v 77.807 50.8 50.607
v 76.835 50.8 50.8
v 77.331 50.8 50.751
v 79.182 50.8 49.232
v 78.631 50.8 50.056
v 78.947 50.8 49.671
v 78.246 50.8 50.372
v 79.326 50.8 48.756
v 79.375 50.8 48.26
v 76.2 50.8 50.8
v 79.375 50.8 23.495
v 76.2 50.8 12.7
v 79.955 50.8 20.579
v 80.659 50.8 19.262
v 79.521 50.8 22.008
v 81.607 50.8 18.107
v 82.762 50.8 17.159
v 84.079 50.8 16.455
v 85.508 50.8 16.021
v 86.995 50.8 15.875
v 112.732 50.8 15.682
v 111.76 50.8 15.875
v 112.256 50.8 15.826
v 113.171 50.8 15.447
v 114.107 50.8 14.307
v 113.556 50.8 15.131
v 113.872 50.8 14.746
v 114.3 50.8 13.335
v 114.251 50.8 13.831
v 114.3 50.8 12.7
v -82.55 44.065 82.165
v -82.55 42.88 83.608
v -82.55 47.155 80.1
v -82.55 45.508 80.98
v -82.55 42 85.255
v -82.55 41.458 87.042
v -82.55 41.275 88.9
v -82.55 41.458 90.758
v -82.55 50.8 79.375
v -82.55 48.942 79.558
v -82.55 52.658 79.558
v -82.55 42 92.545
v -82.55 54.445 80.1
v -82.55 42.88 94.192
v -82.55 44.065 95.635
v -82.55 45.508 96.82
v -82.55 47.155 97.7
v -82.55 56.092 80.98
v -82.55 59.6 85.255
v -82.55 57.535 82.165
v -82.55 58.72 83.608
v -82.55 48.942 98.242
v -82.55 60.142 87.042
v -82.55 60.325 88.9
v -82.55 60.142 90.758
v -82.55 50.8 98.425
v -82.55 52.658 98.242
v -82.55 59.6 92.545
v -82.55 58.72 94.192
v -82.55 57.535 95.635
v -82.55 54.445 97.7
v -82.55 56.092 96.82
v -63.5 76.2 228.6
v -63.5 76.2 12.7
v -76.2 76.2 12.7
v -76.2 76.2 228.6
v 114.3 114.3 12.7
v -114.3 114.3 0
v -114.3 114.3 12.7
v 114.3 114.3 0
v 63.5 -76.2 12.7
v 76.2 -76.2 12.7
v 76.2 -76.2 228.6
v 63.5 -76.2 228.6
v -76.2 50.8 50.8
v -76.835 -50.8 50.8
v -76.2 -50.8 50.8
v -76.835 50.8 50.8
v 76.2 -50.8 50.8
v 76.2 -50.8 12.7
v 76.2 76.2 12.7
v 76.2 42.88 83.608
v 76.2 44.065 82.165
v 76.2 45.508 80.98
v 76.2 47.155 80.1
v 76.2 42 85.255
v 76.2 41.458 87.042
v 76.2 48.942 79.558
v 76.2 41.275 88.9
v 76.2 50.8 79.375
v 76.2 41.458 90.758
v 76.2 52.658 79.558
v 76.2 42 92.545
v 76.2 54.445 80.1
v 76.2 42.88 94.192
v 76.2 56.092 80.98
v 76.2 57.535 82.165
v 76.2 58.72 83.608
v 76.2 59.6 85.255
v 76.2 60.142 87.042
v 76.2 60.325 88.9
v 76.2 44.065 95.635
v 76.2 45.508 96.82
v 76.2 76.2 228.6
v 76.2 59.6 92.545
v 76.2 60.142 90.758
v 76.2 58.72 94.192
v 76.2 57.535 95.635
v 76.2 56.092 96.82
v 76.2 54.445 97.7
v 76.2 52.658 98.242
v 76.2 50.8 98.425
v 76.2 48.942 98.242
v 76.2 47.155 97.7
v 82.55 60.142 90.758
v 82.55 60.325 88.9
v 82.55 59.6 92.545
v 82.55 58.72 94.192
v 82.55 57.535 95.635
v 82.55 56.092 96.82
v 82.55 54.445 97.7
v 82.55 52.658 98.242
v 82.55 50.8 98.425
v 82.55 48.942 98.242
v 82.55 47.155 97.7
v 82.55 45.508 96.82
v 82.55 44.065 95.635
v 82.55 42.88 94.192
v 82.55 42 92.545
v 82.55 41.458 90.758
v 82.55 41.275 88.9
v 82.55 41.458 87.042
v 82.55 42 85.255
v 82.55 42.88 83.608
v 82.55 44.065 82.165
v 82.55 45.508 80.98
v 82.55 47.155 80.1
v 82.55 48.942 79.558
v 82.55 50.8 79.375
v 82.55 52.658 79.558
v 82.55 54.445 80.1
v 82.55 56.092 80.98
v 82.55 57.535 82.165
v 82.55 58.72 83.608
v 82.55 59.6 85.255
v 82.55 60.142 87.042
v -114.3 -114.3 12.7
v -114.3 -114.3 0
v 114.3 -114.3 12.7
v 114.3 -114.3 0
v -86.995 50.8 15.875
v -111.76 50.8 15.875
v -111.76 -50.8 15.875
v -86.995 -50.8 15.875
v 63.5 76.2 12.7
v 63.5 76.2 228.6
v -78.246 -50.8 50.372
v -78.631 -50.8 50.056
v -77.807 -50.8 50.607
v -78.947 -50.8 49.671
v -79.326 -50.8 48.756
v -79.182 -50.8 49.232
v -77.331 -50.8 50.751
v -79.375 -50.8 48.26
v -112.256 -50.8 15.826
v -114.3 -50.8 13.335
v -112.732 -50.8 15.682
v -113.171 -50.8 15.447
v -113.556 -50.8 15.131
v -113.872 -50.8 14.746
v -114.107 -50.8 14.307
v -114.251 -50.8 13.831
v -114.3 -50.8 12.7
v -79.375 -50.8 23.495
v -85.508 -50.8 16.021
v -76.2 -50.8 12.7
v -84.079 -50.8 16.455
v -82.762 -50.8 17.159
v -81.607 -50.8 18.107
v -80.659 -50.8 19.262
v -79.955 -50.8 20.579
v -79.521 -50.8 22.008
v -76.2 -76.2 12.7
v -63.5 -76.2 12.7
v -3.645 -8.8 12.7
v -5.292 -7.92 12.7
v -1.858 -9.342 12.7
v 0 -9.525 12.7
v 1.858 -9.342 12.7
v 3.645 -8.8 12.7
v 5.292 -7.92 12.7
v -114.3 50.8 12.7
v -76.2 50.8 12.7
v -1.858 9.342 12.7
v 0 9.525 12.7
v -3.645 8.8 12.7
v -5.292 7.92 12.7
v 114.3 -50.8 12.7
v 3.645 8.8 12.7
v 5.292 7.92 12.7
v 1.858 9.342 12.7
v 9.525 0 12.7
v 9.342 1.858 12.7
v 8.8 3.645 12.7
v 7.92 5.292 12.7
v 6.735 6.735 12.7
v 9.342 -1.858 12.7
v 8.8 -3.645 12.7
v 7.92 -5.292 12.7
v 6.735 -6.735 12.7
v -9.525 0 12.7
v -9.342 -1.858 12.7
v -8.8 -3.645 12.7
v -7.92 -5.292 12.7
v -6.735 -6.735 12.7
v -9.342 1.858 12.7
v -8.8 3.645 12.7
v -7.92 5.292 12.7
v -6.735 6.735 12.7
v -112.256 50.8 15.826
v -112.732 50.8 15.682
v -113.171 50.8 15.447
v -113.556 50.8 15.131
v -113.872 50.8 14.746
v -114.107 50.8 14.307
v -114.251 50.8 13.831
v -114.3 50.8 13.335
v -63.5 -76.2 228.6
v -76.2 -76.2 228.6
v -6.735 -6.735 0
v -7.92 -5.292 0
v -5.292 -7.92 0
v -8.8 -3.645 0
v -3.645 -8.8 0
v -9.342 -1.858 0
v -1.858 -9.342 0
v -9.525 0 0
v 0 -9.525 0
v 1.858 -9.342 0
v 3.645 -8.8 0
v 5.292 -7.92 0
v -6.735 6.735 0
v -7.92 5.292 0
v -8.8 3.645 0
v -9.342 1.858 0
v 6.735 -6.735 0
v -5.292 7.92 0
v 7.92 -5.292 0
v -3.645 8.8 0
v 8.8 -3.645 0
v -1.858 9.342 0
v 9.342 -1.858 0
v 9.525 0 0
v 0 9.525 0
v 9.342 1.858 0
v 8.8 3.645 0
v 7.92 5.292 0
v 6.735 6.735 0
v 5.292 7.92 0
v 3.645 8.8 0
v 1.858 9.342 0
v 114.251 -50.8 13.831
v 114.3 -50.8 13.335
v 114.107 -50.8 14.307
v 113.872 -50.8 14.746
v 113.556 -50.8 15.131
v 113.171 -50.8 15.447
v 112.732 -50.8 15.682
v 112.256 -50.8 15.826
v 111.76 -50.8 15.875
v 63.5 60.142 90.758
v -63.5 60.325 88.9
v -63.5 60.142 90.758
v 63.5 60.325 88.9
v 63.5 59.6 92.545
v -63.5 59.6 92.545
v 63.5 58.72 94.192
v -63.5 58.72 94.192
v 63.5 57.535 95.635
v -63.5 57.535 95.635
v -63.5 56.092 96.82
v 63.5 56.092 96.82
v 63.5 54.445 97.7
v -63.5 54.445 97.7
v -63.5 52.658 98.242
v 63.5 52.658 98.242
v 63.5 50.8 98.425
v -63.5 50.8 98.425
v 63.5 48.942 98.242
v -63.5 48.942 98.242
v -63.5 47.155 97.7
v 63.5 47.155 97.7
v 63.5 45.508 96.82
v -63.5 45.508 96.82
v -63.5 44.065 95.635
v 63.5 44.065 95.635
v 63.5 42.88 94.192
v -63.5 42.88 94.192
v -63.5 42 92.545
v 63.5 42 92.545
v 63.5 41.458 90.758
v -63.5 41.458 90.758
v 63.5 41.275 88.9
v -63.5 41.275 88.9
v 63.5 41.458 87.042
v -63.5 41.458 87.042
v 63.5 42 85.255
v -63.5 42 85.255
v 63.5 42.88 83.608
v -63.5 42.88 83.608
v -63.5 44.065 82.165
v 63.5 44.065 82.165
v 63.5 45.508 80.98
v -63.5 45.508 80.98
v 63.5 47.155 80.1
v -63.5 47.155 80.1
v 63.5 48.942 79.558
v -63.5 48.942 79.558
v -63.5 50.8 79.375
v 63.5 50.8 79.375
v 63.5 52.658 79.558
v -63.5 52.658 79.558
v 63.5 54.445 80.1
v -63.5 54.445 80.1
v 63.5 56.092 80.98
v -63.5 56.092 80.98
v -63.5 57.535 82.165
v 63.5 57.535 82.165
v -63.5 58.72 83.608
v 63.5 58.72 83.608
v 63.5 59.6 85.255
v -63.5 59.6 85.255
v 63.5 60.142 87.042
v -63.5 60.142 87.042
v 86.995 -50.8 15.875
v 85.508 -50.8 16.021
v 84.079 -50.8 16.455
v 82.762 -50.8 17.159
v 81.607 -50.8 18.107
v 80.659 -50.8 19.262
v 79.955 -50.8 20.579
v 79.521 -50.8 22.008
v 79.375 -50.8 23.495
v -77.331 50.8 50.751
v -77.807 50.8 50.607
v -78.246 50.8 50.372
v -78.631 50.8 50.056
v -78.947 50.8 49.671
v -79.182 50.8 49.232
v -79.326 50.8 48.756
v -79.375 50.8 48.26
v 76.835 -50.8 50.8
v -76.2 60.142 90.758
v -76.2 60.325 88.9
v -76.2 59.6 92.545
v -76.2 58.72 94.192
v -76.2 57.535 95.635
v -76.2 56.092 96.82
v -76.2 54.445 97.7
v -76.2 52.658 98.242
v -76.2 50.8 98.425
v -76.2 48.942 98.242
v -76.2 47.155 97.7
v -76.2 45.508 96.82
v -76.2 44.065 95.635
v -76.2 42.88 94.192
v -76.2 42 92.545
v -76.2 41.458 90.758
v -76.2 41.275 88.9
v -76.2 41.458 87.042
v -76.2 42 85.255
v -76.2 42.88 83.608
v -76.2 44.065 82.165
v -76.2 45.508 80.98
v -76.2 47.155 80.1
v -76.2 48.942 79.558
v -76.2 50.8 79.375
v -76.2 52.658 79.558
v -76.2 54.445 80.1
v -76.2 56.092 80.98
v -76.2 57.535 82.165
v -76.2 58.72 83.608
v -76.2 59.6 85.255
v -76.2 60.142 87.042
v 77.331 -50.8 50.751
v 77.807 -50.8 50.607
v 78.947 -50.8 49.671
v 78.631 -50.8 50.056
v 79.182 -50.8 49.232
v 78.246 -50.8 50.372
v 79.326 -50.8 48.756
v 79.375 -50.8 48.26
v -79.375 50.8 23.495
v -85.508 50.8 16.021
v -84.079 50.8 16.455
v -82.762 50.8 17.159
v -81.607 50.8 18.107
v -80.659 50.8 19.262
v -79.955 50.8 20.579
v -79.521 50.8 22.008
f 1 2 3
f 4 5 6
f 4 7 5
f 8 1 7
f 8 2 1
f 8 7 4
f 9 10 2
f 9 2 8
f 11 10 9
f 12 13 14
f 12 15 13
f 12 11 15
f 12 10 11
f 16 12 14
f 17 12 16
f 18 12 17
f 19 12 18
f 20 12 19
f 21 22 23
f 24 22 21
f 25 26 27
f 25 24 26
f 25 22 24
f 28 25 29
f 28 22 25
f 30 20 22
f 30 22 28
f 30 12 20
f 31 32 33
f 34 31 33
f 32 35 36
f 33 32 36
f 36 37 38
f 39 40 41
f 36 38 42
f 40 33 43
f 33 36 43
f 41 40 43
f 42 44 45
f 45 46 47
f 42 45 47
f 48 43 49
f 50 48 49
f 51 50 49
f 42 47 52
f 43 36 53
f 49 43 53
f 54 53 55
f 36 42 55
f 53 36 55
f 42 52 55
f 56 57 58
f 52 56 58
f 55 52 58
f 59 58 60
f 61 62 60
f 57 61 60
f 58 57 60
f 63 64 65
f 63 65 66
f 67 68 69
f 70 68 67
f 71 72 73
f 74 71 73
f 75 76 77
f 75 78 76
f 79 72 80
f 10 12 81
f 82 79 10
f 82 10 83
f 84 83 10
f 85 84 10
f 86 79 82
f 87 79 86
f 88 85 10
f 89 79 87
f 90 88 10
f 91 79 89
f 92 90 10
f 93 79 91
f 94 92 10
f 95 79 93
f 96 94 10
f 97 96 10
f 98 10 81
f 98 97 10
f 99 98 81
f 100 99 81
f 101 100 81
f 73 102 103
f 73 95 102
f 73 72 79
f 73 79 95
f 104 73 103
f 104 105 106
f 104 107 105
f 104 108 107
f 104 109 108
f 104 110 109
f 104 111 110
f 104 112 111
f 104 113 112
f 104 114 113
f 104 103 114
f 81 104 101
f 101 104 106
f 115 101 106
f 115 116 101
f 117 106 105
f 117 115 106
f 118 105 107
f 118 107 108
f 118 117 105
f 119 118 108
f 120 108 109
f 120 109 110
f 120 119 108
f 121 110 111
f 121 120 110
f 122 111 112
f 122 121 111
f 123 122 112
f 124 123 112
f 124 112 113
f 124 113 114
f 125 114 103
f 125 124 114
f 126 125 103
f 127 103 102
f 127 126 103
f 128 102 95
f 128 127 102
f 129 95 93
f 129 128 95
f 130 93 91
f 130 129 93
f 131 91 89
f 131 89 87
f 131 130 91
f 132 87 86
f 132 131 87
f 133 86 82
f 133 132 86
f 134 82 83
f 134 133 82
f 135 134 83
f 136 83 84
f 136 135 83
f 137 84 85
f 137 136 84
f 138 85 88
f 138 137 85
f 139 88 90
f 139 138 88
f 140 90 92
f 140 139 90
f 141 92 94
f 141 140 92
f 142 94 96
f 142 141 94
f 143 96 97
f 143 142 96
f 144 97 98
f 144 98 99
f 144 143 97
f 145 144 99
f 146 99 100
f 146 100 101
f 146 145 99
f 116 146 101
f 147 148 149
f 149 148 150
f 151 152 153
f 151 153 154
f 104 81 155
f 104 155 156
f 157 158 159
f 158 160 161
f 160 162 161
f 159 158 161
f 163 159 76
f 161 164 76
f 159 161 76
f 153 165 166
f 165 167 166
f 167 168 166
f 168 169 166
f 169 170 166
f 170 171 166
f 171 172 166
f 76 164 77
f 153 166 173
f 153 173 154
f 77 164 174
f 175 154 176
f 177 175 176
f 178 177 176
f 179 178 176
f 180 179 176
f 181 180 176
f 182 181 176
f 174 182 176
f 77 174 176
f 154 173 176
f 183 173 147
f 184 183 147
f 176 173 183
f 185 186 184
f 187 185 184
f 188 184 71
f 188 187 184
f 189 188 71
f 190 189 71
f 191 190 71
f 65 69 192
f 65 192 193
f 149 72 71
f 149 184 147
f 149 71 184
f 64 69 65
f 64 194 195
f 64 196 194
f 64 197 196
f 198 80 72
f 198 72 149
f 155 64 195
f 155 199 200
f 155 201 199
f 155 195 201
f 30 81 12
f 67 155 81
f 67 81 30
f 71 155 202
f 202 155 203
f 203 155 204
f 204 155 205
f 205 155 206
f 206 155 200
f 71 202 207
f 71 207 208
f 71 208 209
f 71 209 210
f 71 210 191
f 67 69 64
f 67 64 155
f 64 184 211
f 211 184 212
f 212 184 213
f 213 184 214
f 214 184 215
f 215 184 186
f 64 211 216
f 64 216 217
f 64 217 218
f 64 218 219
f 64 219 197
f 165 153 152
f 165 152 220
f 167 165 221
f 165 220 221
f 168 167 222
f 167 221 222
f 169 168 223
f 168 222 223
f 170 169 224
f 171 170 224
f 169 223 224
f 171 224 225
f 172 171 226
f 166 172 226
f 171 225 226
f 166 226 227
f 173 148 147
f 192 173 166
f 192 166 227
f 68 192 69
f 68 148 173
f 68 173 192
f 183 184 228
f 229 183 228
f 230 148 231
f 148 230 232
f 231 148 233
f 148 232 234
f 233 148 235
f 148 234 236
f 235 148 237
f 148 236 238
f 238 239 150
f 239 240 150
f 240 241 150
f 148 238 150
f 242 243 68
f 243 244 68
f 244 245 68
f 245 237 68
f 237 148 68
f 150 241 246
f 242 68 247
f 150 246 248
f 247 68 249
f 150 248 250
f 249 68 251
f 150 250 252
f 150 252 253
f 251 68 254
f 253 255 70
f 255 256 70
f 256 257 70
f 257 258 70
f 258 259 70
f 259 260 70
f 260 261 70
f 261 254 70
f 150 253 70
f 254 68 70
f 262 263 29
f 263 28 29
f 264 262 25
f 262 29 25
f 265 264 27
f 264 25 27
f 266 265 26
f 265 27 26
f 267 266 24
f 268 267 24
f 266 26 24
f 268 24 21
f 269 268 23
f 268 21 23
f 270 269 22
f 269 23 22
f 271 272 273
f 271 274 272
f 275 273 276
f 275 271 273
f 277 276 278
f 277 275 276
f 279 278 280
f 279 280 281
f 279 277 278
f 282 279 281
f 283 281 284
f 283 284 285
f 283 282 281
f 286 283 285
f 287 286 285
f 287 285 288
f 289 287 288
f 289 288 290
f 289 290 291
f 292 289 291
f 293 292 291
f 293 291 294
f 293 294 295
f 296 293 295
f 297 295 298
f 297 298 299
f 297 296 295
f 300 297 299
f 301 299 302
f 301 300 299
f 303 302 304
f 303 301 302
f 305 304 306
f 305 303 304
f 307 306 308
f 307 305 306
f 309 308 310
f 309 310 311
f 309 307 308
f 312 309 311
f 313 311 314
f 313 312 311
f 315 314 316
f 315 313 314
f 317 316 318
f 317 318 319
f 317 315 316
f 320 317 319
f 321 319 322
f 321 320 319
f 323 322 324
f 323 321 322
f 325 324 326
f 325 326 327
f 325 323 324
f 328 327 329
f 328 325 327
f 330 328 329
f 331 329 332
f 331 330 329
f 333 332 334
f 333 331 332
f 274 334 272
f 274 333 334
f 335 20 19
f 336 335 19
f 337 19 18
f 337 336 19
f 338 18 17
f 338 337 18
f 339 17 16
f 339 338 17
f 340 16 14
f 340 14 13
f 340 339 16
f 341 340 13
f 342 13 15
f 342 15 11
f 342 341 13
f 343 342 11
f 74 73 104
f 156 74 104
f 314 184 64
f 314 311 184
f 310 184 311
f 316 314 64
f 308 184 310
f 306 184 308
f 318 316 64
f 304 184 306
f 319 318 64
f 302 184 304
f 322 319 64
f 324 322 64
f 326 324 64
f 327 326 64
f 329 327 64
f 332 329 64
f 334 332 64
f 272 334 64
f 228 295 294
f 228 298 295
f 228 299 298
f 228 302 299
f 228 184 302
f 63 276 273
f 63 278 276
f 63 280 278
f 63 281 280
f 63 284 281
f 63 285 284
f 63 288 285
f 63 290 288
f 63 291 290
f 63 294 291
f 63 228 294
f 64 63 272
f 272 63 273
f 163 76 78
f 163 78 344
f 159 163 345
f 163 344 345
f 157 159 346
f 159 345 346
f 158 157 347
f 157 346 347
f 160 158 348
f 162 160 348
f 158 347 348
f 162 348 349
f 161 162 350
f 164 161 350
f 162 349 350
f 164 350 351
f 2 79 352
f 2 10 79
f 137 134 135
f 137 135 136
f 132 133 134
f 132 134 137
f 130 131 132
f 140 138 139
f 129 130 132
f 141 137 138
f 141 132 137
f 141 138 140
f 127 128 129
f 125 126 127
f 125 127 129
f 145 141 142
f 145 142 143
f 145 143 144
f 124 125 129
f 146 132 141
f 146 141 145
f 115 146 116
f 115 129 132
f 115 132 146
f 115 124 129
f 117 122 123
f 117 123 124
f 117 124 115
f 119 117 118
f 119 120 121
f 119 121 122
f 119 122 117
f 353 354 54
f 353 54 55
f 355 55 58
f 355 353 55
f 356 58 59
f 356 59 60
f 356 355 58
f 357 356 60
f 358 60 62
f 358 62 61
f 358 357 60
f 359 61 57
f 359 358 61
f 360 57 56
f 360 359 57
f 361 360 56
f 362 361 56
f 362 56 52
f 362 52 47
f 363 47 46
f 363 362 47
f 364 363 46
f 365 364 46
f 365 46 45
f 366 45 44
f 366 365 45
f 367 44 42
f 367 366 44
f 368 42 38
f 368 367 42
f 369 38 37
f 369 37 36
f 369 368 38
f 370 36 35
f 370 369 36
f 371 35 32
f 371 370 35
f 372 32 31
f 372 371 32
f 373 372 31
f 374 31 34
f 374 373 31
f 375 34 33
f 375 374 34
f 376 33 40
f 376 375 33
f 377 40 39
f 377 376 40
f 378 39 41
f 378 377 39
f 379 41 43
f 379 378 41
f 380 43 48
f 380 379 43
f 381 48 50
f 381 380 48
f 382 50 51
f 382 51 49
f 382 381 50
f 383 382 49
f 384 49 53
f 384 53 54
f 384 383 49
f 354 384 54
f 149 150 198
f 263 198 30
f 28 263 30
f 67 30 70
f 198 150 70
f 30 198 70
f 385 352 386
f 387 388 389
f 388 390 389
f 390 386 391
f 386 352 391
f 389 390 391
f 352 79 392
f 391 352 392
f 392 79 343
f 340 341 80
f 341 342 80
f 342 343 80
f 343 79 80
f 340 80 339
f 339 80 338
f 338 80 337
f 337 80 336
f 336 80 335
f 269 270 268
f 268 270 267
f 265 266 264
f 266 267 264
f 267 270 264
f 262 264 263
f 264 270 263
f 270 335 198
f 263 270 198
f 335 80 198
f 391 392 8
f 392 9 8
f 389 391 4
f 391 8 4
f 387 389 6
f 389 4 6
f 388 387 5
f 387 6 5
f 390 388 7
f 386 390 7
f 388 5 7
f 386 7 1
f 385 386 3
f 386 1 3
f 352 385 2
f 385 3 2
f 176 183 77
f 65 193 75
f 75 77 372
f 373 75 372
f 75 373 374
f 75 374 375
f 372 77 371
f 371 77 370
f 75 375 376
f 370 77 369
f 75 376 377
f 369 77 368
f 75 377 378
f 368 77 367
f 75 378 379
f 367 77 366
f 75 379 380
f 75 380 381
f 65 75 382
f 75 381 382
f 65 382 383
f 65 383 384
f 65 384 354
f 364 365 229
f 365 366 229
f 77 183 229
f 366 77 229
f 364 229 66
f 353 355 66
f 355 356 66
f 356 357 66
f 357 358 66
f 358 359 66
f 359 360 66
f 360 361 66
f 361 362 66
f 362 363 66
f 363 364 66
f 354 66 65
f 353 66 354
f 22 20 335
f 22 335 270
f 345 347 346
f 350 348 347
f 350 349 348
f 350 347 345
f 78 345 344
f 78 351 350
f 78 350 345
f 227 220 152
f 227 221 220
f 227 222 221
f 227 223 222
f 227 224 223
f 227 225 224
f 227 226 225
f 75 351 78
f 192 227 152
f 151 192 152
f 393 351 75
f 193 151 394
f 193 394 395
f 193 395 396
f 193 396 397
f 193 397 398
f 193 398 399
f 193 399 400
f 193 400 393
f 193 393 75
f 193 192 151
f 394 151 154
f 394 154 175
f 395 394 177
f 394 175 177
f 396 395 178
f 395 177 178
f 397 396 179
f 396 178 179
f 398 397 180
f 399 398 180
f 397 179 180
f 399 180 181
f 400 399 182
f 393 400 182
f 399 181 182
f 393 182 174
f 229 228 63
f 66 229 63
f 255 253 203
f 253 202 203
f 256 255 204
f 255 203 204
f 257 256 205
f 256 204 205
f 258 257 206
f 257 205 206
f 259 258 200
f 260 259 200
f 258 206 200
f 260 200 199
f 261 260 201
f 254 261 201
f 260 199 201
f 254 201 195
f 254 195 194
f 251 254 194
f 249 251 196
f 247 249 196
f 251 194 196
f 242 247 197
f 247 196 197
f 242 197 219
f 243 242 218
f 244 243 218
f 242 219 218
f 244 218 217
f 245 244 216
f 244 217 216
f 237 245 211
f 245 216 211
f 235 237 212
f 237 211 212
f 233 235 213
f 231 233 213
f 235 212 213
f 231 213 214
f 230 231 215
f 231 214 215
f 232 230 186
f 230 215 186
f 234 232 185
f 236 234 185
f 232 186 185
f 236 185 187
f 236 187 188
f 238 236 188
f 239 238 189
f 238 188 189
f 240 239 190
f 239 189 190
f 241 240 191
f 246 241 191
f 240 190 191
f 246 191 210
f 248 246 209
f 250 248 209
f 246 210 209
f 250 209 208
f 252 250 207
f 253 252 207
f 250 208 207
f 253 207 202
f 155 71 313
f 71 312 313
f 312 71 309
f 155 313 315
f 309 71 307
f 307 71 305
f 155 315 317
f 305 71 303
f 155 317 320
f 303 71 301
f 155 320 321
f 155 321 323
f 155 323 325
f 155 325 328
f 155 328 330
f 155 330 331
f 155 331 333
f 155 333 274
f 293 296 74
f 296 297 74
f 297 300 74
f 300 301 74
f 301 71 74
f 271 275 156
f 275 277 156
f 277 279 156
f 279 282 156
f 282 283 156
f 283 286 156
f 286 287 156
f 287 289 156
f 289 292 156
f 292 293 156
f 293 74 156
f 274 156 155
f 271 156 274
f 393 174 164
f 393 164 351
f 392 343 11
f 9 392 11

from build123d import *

# Parameters (mm, degrees)
F0_W      = 228.6
F0_H      = 228.6
F1_DEPTH  = 12.7
F2_W      = 152.4
F2_H      = 215.9
F3_DEPTH  = 76.2
F4_DEPTH  = 63.5
F5_R      = 9.525
F6_DEPTH  = 12.7
F7_R      = 9.525
F8_DEPTH  = 82.55
F9_W      = 38.1
F9_H      = 101.6
F10_DEPTH = 15.875
F11_W     = 3.175
F11_H     = 101.6
F12_DEPTH = 50.8
F13_R     = 2.54
F14_R     = 7.62


with BuildPart() as f1:
    # F0 (on Top) → F1 (new body)
    with BuildSketch(Plane.XY):
        Rectangle(F0_W, F0_H)
    extrude(amount=F1_DEPTH)

    # F2 (on Right) → F3 (join, symmetric)
    with BuildSketch(Plane.YZ):
        with Locations((0, 120.65)):
            Rectangle(F2_W, F2_H)
    extrude(amount=F3_DEPTH, both=True)

    # F2 (on Right) → F4 (cut, symmetric)
    with BuildSketch(Plane.YZ):
        with Locations((0, 120.65)):
            Rectangle(F2_W, F2_H)
    extrude(amount=F4_DEPTH, both=True, mode=Mode.SUBTRACT)

    # F5 (on Top) → F6 (cut, symmetric)
    with BuildSketch(Plane.XY):
        Circle(F5_R)
    extrude(amount=F6_DEPTH, both=True, mode=Mode.SUBTRACT)

    # F7 (on Right) → F8 (join, symmetric)
    with BuildSketch(Plane.YZ):
        with Locations((50.8, 88.9)):
            Circle(F7_R)
    extrude(amount=F8_DEPTH, both=True)

    # F9 (on Top) → F10 (join)
    with BuildSketch(Plane.XY):
        with Locations((-95.25, 0)):
            Rectangle(F9_W, F9_H)
        with Locations((95.25, 0)):
            Rectangle(F9_W, F9_H)
    extrude(amount=F10_DEPTH)

    # F11 (on Top) → F12 (join)
    with BuildSketch(Plane.XY):
        with Locations((-77.7875, 0)):
            Rectangle(F11_W, F11_H)
        with Locations((77.7875, 0)):
            Rectangle(F11_W, F11_H)
    extrude(amount=F12_DEPTH)

    # F13
    f13_edges = [f1.edges().sort_by_distance(p)[0] for p in [
        (-114.3, 0, 15.875),
        (-79.375, 0, 50.8),
        (79.375, 0, 50.8),
        (114.3, 0, 15.875),
    ]]
    fillet(f13_edges, radius=F13_R)

    # F14
    f14_edges = [f1.edges().sort_by_distance(p)[0] for p in [
        (-79.375, 0, 15.875),
        (79.375, 0, 15.875),
    ]]
    fillet(f14_edges, radius=F14_R)


solid = f1.part
